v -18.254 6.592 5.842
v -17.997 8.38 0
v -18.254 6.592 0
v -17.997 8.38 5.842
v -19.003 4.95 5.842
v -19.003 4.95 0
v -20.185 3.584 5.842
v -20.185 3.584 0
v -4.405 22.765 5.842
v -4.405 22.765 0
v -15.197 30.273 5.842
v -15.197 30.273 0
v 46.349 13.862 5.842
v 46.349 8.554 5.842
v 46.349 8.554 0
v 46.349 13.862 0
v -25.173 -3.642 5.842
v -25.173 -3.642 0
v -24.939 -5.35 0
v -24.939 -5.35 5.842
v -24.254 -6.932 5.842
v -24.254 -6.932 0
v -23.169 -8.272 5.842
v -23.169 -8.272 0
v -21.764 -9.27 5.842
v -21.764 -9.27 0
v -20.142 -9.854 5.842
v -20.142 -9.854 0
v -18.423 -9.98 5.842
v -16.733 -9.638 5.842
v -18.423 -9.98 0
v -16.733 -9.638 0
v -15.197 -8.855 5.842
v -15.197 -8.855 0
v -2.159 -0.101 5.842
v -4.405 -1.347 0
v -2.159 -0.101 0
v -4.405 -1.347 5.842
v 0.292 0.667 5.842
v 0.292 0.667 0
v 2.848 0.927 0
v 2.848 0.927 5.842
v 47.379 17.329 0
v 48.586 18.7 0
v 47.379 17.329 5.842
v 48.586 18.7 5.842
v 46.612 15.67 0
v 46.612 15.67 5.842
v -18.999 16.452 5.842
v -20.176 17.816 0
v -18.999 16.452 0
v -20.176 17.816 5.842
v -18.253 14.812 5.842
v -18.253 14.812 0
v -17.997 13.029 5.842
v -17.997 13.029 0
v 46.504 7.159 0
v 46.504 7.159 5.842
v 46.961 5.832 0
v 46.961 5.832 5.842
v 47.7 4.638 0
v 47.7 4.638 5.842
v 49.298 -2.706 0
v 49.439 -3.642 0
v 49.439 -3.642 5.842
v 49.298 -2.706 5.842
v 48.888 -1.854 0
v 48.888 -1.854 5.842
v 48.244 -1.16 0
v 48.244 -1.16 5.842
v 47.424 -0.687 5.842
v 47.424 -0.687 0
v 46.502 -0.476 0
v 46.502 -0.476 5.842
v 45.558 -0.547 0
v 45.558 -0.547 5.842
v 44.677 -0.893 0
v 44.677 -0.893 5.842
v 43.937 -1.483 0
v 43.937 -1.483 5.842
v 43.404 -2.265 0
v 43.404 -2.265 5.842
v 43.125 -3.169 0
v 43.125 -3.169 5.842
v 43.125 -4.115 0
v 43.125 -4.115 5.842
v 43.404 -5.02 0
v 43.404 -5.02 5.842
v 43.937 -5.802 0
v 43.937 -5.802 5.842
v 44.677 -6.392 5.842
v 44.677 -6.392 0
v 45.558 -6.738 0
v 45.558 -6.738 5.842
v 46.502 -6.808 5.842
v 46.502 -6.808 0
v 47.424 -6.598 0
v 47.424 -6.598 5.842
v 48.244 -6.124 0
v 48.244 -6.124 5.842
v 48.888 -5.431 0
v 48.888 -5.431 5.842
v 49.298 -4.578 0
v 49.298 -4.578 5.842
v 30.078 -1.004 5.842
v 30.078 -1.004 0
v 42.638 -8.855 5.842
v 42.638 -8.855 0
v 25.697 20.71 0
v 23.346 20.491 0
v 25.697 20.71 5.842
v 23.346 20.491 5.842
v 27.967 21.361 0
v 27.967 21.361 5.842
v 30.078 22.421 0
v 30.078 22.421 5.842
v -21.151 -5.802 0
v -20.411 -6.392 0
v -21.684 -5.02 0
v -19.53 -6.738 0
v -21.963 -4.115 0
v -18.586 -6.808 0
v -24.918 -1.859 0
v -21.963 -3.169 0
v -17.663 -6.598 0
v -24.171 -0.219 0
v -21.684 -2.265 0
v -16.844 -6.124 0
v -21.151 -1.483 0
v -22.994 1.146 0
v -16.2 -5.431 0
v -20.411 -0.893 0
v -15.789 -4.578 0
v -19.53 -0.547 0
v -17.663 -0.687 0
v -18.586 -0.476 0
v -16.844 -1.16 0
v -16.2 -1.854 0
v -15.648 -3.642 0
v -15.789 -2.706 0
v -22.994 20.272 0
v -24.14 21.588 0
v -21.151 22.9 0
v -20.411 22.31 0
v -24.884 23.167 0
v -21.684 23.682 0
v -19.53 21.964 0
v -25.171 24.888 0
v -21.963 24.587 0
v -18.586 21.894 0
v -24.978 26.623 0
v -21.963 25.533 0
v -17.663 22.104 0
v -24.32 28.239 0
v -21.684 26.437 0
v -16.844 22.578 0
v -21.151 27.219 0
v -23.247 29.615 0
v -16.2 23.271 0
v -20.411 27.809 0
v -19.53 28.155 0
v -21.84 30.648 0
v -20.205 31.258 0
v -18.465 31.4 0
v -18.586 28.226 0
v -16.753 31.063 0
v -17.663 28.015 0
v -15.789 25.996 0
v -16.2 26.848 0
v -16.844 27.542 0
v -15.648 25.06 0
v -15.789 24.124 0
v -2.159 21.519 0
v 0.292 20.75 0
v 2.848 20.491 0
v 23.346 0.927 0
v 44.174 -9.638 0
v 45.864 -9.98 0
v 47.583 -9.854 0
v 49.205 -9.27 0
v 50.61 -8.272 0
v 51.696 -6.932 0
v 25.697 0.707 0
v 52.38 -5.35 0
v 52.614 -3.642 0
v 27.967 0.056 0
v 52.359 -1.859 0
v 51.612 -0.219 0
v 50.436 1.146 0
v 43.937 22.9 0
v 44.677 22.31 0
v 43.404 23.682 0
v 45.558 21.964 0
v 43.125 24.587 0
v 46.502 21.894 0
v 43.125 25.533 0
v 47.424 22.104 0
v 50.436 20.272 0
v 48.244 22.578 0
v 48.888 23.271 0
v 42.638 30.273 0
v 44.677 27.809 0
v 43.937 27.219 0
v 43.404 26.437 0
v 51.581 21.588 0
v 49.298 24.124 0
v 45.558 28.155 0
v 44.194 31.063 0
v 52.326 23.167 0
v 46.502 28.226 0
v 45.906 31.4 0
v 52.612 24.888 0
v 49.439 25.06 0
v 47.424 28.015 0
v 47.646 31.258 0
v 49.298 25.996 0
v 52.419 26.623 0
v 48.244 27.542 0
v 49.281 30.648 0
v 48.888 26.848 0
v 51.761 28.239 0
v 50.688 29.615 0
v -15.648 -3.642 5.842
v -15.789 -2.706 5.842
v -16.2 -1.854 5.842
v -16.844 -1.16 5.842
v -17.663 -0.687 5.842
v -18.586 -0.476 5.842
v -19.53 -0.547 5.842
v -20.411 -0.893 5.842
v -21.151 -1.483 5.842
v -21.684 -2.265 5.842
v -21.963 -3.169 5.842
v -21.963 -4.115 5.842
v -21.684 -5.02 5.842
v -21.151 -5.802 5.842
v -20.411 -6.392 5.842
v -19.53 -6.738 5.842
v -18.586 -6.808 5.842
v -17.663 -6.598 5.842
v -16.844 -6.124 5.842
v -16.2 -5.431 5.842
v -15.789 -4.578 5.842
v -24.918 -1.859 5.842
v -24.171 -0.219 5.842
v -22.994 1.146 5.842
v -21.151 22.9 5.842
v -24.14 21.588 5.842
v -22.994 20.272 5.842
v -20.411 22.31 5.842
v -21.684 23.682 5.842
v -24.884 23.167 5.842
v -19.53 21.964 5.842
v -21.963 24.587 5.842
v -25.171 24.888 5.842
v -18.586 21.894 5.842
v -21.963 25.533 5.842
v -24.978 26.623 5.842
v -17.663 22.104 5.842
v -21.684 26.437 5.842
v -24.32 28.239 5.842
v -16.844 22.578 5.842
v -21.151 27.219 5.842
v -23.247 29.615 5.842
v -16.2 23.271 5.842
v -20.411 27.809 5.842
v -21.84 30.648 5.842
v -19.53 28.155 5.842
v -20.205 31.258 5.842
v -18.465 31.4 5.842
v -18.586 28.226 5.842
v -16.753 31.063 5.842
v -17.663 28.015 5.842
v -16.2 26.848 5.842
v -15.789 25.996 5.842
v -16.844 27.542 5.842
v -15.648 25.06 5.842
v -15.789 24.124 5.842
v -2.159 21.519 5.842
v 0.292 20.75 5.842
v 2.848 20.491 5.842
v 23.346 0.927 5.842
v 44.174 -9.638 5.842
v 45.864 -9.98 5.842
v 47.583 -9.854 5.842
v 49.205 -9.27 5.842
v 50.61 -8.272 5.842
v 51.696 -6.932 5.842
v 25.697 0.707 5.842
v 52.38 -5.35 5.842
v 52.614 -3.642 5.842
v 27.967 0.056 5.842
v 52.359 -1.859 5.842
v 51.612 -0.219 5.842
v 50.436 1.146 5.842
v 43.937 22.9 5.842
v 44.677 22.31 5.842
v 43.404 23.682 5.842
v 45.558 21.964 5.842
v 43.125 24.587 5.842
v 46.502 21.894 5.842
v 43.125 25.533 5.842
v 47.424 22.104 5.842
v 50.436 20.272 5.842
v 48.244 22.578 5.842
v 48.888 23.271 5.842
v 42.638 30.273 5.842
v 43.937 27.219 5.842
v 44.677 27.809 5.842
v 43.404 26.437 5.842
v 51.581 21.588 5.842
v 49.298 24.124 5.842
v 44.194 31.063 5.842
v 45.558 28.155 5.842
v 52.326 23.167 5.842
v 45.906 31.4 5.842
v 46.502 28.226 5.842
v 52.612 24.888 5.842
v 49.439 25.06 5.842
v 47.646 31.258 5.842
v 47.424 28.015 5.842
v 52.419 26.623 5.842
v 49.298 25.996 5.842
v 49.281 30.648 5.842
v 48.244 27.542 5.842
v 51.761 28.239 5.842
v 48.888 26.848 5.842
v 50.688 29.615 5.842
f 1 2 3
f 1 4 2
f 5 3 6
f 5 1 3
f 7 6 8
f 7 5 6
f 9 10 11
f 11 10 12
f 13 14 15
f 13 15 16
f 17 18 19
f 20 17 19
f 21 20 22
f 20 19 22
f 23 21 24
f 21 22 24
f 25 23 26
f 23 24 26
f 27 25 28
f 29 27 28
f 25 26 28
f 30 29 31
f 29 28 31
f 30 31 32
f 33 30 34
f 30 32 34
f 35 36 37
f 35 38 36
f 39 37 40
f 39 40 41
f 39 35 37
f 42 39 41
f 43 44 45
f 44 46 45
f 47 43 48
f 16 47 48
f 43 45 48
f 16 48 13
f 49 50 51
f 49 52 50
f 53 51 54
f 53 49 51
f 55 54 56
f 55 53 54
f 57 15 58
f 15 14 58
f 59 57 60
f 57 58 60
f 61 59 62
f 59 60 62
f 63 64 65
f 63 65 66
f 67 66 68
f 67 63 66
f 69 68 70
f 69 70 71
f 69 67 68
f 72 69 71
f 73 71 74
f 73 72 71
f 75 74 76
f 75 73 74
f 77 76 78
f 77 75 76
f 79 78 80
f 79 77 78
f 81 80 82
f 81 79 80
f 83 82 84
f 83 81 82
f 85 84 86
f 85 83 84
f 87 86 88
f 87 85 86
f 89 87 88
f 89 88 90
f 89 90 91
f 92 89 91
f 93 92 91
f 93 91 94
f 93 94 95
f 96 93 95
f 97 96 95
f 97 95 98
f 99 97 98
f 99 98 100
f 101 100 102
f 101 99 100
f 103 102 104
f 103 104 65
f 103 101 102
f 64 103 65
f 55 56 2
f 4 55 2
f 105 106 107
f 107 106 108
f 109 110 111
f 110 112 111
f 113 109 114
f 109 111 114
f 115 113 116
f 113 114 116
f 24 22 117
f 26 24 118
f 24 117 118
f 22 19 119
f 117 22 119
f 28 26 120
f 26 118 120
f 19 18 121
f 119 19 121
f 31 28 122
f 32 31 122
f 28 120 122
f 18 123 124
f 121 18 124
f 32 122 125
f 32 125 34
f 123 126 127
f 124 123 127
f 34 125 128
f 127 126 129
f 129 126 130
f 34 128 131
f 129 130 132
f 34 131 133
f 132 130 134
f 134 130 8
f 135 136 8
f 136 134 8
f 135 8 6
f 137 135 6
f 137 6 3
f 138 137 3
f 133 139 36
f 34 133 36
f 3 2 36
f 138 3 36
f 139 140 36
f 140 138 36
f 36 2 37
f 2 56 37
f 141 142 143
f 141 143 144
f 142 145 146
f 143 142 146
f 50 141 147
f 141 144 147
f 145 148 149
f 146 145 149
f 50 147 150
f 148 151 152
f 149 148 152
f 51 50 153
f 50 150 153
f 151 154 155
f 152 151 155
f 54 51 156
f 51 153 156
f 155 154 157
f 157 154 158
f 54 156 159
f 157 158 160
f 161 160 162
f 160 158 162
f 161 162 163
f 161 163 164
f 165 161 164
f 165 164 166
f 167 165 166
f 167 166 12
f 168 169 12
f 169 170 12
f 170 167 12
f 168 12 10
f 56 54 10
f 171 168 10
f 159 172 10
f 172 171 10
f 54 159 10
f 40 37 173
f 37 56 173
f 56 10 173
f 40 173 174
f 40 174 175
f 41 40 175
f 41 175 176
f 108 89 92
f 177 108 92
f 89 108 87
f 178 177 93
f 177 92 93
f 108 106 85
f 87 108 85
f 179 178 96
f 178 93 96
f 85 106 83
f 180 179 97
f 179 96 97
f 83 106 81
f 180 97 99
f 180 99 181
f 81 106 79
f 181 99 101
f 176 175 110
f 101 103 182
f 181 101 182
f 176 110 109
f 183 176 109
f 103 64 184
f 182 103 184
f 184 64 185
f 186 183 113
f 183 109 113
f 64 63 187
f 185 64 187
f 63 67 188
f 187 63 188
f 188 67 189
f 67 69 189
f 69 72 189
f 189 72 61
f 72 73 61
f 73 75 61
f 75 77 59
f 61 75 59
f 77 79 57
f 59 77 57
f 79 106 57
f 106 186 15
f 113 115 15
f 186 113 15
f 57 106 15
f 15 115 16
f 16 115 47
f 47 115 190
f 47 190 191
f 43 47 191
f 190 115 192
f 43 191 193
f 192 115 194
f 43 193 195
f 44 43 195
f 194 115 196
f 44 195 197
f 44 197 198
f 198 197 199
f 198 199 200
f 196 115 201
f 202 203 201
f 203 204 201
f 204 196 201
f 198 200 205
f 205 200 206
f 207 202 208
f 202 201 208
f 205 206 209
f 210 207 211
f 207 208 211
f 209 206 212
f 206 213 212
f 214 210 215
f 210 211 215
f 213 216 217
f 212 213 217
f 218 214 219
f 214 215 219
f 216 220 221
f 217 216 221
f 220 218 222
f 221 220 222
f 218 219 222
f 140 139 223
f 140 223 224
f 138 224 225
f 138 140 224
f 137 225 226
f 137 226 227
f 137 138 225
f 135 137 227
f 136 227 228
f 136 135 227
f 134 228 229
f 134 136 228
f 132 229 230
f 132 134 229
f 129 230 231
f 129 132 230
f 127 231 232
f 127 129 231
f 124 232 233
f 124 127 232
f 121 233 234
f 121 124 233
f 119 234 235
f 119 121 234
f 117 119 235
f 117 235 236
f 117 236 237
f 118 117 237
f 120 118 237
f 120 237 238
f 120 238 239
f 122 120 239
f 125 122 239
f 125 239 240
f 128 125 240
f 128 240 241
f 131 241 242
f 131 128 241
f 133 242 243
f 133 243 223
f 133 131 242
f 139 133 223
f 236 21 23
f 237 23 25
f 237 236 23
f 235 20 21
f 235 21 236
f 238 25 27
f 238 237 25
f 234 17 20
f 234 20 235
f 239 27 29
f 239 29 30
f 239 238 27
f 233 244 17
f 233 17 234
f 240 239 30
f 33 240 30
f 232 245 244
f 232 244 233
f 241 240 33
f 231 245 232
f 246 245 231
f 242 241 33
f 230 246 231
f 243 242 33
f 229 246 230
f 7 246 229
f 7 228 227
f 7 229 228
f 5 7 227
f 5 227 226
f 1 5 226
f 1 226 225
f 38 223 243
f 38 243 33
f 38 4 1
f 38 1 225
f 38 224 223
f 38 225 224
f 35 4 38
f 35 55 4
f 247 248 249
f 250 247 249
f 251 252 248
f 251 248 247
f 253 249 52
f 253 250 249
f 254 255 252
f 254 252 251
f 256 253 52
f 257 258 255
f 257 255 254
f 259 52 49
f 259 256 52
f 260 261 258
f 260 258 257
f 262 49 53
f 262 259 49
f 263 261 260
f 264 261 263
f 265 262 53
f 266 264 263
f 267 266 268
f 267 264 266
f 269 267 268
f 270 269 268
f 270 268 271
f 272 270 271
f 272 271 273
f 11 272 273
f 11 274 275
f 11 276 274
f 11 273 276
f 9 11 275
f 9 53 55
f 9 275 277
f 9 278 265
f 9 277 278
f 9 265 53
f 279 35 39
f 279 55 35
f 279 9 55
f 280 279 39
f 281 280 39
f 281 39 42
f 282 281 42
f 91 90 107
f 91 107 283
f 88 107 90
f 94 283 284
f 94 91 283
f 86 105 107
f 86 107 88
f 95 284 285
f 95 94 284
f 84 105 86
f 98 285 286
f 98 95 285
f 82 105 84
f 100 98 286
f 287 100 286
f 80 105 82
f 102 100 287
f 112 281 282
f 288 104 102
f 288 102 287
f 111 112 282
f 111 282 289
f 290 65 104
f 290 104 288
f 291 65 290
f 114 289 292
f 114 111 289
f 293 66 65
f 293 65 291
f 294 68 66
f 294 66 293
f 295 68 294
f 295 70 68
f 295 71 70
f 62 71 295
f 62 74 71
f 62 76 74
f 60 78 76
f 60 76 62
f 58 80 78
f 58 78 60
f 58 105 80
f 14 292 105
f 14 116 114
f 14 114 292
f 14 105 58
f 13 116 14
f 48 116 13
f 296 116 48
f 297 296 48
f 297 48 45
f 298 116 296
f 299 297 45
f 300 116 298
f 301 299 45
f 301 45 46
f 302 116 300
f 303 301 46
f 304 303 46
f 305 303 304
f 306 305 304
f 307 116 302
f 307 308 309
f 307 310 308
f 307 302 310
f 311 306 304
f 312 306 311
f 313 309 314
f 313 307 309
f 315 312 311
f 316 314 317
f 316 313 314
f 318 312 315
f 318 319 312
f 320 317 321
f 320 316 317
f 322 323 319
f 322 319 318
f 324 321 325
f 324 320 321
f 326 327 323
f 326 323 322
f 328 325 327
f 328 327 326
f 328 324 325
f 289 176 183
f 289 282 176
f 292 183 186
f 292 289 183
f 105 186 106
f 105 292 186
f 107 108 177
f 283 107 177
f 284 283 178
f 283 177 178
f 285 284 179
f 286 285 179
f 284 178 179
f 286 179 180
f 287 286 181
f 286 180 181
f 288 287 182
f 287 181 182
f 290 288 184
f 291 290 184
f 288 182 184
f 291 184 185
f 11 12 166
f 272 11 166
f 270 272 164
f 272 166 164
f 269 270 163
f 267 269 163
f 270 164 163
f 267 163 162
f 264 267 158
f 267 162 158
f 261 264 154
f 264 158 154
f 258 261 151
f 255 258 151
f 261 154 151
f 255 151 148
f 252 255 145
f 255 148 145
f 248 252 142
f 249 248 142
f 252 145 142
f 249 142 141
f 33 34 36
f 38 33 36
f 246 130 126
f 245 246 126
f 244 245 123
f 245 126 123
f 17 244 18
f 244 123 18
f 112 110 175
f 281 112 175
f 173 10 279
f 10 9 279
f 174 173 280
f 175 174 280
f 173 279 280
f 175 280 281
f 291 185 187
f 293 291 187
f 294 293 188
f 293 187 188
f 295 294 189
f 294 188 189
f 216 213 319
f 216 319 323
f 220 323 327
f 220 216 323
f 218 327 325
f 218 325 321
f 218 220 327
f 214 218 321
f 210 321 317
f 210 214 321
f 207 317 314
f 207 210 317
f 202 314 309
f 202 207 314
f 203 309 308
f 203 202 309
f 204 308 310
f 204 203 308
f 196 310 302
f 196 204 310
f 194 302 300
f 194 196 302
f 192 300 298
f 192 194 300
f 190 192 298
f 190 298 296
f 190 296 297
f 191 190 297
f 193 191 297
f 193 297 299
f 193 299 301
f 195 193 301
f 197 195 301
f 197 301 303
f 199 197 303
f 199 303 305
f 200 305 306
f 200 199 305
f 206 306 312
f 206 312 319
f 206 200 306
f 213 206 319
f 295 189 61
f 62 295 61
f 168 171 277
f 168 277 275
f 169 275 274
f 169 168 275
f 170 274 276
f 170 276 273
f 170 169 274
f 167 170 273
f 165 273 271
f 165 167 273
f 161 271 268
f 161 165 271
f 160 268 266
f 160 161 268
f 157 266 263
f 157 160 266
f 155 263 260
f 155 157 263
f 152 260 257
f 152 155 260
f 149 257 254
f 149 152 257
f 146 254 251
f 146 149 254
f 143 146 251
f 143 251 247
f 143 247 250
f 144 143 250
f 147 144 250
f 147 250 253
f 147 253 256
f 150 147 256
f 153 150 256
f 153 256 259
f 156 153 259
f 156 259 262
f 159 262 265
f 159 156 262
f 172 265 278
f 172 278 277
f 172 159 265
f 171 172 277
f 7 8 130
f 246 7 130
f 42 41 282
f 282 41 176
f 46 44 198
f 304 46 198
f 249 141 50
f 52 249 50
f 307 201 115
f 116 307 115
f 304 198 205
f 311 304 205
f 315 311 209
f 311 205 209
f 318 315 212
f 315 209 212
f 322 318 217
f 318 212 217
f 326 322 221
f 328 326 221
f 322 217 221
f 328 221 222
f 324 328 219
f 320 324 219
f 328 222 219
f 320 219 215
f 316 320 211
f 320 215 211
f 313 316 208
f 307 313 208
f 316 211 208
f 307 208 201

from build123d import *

# Parameters (mm, degrees)
SKETCH1_R           = 3.175
BOSS_EXTRUDE1_DEPTH = 5.842
FILLET1_R           = 6.35
FILLET2_R           = 12.7


with BuildPart() as part:
    # Sketch1 → Boss-Extrude1 (new body)
    with BuildSketch(Plane.XY):
        with BuildLine():
            Line((-22.994485403, 20.272024726), (-17.997254848, 15.918288597))
            Line((-17.997254848, 15.918288597), (-17.997254848, 5.482991472))
            Line((-17.997254848, 5.482991472), (-22.994485403, 1.145618131))
            ThreePointArc((-22.994485403, 1.145618131), (-24.602923257, -1.012071311), (-25.173214286, -3.642178571))
            ThreePointArc((-25.173214286, -3.642178571), (-21.763981419, -9.270178986), (-15.197028879, -8.854978145))
            Line((-15.197028879, -8.854978145), (-1.135121582, 0.926921642))
            Line((-1.135121582, 0.926921642), (26.988693011, 0.926921642))
            Line((26.988693011, 0.926921642), (42.638100307, -8.854978145))
            ThreePointArc((42.638100307, -8.854978145), (49.205052848, -9.270178986), (52.614285714, -3.642178571))
            ThreePointArc((52.614285714, -3.642178571), (52.043994686, -1.012071311), (50.435556832, 1.145618131))
            Line((50.435556832, 1.145618131), (46.348568334, 6.363266694))
            Line((46.348568334, 6.363266694), (46.348568334, 16.798563819))
            Line((46.348568334, 16.798563819), (50.435556832, 20.272024726))
            ThreePointArc((50.435556832, 20.272024726), (51.272005862, 28.964336626), (42.638100307, 30.272621002))
            Line((42.638100307, 30.272621002), (26.988693011, 20.490721215))
            Line((26.988693011, 20.490721215), (-1.135121582, 20.490721215))
            Line((-1.135121582, 20.490721215), (-15.197028879, 30.272621002))
            ThreePointArc((-15.197028879, 30.272621002), (-23.830934433, 28.964336626), (-22.994485403, 20.272024726))
        make_face()
        with Locations((-18.823214286, -3.642178571)):
            Circle(SKETCH1_R, mode=Mode.SUBTRACT)
        with Locations((46.264285714, -3.642178571)):
            Circle(SKETCH1_R, mode=Mode.SUBTRACT)
        with Locations((-18.823214286, 25.059821429)):
            Circle(SKETCH1_R, mode=Mode.SUBTRACT)
        with Locations((46.264285714, 25.059821429)):
            Circle(SKETCH1_R, mode=Mode.SUBTRACT)
    extrude(amount=BOSS_EXTRUDE1_DEPTH)

    # Fillet1
    fillet1_edges = [part.edges().sort_by_distance(p)[0] for p in [
        (-17.997254848, 5.482991472, 2.921),
        (-17.997254848, 15.918288597, 2.921),
        (46.348568334, 16.798563819, 2.921),
        (46.348568334, 6.363266694, 2.921),
    ]]
    fillet(fillet1_edges, radius=FILLET1_R)

    # Fillet2
    fillet2_edges = [part.edges().sort_by_distance(p)[0] for p in [
        (26.988693011, 0.926921642, 2.921),
        (-1.135121582, 0.926921642, 2.921),
        (-1.135121582, 20.490721215, 2.921),
        (26.988693011, 20.490721215, 2.921),
    ]]
    fillet(fillet2_edges, radius=FILLET2_R)


solid = part.part
